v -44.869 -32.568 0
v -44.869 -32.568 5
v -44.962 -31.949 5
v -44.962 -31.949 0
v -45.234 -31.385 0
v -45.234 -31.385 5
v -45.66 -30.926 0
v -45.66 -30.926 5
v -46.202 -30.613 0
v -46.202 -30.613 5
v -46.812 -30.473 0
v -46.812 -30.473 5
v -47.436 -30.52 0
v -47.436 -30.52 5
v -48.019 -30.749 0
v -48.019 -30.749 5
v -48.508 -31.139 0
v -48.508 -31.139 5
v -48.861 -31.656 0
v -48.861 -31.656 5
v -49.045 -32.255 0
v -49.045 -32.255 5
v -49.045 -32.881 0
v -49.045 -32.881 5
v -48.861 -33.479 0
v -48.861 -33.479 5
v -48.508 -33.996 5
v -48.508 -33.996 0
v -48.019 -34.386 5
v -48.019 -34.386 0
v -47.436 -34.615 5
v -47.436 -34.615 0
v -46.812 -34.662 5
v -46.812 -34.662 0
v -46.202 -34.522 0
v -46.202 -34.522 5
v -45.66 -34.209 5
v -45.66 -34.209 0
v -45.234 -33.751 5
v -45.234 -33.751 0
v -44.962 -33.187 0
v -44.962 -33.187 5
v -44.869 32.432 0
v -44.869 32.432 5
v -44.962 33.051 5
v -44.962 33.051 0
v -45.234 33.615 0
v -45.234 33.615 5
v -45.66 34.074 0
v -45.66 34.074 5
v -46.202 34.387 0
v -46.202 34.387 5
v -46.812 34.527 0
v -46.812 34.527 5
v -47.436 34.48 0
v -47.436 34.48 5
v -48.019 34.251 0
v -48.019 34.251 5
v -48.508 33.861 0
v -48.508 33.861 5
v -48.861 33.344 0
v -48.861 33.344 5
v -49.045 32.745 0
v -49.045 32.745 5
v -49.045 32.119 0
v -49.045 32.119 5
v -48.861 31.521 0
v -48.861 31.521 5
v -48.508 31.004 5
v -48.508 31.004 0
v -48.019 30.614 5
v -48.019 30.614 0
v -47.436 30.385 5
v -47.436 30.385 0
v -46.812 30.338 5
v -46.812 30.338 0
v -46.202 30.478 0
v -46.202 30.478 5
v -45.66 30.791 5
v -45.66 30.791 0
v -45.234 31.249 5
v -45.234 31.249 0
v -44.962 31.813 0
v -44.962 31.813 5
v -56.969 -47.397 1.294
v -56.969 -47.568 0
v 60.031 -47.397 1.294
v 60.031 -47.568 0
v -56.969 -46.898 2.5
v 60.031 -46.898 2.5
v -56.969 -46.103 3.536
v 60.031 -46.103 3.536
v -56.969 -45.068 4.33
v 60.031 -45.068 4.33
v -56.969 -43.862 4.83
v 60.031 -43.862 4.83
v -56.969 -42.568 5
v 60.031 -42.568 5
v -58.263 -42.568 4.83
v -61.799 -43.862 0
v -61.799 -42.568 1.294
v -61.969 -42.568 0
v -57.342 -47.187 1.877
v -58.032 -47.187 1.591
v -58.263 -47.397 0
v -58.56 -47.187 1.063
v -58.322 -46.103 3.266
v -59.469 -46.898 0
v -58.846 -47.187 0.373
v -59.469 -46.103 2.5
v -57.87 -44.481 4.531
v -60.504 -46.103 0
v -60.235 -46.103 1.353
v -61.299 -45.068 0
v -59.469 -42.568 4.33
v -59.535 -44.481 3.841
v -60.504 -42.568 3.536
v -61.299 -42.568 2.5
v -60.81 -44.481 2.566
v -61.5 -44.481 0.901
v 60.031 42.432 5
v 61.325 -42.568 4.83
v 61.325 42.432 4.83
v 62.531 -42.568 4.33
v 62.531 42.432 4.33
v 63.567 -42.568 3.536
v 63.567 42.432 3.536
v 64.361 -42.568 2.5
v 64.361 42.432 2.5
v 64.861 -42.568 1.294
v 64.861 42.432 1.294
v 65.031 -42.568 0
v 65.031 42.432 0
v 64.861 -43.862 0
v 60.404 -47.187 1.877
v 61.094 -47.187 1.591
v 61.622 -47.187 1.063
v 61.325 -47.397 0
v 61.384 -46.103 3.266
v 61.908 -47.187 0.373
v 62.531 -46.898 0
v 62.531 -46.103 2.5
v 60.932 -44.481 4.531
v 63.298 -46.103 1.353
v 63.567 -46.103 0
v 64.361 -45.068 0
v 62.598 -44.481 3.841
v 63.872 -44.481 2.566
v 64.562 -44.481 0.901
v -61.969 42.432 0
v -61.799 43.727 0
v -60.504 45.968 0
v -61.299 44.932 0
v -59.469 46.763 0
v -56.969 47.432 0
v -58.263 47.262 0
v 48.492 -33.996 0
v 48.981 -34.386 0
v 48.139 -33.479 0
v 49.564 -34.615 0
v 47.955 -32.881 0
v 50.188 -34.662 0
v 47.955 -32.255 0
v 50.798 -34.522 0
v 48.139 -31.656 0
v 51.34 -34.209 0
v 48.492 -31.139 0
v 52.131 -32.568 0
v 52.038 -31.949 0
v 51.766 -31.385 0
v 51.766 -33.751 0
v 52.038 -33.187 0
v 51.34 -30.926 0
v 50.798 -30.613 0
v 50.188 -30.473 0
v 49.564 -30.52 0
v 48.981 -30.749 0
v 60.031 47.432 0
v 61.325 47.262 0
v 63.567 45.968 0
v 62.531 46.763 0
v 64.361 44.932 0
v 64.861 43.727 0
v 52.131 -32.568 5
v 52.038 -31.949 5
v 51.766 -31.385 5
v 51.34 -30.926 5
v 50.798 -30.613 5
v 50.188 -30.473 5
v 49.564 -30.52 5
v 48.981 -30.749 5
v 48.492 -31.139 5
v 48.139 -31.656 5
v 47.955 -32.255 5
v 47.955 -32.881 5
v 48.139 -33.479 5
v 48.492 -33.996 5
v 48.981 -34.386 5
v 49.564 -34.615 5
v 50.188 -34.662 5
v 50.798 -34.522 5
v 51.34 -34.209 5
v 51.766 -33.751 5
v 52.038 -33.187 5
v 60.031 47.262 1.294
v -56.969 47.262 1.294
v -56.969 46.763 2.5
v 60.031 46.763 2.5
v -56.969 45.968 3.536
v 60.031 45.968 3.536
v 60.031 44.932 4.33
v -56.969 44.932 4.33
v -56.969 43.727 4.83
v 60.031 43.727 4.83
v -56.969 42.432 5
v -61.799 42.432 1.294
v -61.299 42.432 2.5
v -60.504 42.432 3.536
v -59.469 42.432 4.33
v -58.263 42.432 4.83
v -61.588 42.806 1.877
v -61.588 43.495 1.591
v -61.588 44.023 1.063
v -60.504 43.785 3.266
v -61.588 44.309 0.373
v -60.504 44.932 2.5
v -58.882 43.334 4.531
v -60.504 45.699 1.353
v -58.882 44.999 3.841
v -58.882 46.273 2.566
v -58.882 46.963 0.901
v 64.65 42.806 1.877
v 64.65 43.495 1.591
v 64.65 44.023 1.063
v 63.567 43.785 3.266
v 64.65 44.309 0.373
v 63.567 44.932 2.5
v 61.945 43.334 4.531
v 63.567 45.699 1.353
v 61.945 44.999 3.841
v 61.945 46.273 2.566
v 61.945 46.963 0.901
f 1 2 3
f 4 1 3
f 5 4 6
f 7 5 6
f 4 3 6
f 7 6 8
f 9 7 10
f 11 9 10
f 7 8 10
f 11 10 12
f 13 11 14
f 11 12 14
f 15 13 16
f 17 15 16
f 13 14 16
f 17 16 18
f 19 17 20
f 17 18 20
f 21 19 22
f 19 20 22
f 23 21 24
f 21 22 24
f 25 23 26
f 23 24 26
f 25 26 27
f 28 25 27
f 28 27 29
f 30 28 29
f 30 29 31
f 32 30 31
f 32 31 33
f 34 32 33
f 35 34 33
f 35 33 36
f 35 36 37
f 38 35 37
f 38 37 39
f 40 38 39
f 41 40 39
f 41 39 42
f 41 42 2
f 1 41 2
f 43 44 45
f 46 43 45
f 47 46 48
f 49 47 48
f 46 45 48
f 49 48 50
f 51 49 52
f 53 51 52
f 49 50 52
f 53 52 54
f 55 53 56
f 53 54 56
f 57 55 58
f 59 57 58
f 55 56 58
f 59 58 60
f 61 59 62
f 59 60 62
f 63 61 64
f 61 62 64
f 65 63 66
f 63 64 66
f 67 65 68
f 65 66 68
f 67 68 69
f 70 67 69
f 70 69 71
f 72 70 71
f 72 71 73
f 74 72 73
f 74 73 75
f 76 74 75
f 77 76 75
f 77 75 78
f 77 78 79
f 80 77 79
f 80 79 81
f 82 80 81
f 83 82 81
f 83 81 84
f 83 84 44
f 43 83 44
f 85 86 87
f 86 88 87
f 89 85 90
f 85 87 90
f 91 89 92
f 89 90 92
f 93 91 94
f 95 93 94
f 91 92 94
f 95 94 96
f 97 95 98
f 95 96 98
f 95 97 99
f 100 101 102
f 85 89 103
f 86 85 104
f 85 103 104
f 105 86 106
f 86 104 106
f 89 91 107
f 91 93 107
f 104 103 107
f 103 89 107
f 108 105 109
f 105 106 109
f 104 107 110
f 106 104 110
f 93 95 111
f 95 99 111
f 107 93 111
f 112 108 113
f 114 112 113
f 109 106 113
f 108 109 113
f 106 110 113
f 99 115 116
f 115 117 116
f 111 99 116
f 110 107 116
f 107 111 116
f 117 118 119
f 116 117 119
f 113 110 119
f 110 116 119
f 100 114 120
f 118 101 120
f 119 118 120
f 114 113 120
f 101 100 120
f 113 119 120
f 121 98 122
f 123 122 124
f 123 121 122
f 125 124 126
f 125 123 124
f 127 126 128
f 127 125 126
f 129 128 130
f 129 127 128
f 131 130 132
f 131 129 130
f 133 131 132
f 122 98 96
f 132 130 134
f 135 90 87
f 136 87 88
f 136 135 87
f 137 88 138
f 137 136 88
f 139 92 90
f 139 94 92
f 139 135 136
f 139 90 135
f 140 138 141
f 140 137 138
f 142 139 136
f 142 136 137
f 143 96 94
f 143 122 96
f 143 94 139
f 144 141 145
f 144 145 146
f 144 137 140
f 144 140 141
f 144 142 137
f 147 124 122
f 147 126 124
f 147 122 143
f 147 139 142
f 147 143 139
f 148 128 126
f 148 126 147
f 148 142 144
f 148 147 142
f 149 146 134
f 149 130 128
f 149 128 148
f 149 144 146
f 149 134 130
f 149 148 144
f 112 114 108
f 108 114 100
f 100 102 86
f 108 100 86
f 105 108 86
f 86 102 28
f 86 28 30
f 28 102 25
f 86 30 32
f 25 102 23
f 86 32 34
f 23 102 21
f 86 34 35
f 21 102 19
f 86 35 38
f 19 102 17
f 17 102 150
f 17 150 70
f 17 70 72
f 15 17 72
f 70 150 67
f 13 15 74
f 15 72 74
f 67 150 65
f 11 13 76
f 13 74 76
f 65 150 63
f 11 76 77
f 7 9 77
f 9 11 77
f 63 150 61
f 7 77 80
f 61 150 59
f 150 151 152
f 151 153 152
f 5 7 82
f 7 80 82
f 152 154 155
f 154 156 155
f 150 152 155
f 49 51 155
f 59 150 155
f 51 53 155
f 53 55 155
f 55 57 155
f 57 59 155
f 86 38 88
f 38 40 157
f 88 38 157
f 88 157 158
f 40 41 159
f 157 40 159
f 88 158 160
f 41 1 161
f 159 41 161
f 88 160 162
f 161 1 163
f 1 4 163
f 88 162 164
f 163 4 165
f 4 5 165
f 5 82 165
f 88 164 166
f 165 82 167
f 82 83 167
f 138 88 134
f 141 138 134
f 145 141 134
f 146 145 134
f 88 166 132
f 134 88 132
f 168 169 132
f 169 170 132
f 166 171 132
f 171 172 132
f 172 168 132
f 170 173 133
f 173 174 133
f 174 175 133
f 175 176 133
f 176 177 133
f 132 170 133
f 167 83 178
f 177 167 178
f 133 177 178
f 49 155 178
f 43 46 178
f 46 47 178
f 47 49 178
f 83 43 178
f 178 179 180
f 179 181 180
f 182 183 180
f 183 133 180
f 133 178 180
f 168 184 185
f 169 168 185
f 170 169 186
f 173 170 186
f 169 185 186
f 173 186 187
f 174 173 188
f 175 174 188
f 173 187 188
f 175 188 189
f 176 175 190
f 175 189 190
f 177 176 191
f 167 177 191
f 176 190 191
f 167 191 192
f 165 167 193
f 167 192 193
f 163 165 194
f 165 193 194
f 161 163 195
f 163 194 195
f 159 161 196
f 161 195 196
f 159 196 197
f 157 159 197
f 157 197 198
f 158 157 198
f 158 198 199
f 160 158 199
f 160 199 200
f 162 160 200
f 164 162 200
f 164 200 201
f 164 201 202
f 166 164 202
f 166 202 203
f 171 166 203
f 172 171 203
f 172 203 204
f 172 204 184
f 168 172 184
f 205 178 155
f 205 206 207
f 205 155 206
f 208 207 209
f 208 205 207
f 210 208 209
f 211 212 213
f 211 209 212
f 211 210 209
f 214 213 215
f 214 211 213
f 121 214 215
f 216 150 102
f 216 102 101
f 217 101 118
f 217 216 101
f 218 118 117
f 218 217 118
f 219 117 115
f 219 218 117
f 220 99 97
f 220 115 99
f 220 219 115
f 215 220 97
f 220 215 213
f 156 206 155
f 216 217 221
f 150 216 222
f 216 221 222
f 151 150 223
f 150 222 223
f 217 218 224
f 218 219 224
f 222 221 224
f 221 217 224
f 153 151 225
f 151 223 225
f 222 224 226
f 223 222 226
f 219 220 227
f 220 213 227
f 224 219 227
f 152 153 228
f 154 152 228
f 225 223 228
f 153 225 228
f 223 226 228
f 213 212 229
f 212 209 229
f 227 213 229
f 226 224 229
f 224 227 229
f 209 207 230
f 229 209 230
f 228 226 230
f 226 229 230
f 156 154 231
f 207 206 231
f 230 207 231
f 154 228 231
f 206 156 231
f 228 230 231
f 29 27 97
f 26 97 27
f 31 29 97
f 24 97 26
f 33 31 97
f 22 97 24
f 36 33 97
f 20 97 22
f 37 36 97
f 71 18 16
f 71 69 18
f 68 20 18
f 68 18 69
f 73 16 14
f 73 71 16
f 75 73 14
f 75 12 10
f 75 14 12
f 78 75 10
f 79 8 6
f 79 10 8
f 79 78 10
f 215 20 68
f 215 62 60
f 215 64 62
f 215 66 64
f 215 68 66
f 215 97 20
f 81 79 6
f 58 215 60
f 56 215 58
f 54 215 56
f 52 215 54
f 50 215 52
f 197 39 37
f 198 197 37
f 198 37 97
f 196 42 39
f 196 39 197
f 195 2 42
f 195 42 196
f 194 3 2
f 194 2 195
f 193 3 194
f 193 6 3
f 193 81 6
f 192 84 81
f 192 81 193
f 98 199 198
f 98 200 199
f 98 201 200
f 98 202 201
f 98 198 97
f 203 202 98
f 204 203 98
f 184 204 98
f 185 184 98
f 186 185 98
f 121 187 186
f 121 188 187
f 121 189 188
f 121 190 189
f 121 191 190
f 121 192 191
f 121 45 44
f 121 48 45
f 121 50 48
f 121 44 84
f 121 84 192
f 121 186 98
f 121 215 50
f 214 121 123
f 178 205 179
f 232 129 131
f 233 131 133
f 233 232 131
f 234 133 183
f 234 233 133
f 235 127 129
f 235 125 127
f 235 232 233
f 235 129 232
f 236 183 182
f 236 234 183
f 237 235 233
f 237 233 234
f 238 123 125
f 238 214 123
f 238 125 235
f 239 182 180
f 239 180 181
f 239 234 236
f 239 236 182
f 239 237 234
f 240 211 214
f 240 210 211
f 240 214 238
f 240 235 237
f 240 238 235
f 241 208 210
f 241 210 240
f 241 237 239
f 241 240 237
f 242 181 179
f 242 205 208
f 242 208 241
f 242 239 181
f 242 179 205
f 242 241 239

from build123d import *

# Parameters (mm, degrees)
F0_W     = 127
F0_H     = 95
F1_DEPTH = 5
F2_R     = 2.1
F3_DEPTH = 5.001
F4_R     = 4.99999


# Not quite as in the source:
# - a fillet or chamfer is up to 0.001 mm smaller than in the source, because OpenCascade refuses the exact size


with BuildPart() as f1:
    # F0 (on Top) → F1 (new body)
    with BuildSketch(Plane.XY):
        with Locations((1.5311012896, -0.0675843805)):
            Rectangle(F0_W, F0_H)
    extrude(amount=F1_DEPTH)

    # F2 (on face) → F3 (cut, through all)
    with BuildSketch(Plane.XY.offset(5)):
        with Locations((-46.9688987104, 32.4324156195)):
            Circle(F2_R)
        with Locations((-46.9688987104, -32.5675843805)):
            Circle(F2_R)
        with Locations((50.0311012896, -32.5675843805)):
            Circle(F2_R)
    extrude(amount=-F3_DEPTH, mode=Mode.SUBTRACT)

    # F4 (radius 5 in the source; OpenCascade refuses exactly that, so slightly less here)
    f4_edges = [f1.edges().sort_by_distance(p)[0] for p in [
        (1.531101, 47.432416, 5),
        (65.031101, -0.067584, 5),
        (-61.968899, -0.067584, 5),
        (1.531101, -47.567584, 5),
        (-61.968899, -47.567584, 2.5),
        (-61.968899, 47.432416, 2.5),
        (65.031101, 47.432416, 2.5),
        (65.031101, -47.567584, 2.5),
    ]]
    fillet(f4_edges, radius=F4_R)


solid = f1.part
